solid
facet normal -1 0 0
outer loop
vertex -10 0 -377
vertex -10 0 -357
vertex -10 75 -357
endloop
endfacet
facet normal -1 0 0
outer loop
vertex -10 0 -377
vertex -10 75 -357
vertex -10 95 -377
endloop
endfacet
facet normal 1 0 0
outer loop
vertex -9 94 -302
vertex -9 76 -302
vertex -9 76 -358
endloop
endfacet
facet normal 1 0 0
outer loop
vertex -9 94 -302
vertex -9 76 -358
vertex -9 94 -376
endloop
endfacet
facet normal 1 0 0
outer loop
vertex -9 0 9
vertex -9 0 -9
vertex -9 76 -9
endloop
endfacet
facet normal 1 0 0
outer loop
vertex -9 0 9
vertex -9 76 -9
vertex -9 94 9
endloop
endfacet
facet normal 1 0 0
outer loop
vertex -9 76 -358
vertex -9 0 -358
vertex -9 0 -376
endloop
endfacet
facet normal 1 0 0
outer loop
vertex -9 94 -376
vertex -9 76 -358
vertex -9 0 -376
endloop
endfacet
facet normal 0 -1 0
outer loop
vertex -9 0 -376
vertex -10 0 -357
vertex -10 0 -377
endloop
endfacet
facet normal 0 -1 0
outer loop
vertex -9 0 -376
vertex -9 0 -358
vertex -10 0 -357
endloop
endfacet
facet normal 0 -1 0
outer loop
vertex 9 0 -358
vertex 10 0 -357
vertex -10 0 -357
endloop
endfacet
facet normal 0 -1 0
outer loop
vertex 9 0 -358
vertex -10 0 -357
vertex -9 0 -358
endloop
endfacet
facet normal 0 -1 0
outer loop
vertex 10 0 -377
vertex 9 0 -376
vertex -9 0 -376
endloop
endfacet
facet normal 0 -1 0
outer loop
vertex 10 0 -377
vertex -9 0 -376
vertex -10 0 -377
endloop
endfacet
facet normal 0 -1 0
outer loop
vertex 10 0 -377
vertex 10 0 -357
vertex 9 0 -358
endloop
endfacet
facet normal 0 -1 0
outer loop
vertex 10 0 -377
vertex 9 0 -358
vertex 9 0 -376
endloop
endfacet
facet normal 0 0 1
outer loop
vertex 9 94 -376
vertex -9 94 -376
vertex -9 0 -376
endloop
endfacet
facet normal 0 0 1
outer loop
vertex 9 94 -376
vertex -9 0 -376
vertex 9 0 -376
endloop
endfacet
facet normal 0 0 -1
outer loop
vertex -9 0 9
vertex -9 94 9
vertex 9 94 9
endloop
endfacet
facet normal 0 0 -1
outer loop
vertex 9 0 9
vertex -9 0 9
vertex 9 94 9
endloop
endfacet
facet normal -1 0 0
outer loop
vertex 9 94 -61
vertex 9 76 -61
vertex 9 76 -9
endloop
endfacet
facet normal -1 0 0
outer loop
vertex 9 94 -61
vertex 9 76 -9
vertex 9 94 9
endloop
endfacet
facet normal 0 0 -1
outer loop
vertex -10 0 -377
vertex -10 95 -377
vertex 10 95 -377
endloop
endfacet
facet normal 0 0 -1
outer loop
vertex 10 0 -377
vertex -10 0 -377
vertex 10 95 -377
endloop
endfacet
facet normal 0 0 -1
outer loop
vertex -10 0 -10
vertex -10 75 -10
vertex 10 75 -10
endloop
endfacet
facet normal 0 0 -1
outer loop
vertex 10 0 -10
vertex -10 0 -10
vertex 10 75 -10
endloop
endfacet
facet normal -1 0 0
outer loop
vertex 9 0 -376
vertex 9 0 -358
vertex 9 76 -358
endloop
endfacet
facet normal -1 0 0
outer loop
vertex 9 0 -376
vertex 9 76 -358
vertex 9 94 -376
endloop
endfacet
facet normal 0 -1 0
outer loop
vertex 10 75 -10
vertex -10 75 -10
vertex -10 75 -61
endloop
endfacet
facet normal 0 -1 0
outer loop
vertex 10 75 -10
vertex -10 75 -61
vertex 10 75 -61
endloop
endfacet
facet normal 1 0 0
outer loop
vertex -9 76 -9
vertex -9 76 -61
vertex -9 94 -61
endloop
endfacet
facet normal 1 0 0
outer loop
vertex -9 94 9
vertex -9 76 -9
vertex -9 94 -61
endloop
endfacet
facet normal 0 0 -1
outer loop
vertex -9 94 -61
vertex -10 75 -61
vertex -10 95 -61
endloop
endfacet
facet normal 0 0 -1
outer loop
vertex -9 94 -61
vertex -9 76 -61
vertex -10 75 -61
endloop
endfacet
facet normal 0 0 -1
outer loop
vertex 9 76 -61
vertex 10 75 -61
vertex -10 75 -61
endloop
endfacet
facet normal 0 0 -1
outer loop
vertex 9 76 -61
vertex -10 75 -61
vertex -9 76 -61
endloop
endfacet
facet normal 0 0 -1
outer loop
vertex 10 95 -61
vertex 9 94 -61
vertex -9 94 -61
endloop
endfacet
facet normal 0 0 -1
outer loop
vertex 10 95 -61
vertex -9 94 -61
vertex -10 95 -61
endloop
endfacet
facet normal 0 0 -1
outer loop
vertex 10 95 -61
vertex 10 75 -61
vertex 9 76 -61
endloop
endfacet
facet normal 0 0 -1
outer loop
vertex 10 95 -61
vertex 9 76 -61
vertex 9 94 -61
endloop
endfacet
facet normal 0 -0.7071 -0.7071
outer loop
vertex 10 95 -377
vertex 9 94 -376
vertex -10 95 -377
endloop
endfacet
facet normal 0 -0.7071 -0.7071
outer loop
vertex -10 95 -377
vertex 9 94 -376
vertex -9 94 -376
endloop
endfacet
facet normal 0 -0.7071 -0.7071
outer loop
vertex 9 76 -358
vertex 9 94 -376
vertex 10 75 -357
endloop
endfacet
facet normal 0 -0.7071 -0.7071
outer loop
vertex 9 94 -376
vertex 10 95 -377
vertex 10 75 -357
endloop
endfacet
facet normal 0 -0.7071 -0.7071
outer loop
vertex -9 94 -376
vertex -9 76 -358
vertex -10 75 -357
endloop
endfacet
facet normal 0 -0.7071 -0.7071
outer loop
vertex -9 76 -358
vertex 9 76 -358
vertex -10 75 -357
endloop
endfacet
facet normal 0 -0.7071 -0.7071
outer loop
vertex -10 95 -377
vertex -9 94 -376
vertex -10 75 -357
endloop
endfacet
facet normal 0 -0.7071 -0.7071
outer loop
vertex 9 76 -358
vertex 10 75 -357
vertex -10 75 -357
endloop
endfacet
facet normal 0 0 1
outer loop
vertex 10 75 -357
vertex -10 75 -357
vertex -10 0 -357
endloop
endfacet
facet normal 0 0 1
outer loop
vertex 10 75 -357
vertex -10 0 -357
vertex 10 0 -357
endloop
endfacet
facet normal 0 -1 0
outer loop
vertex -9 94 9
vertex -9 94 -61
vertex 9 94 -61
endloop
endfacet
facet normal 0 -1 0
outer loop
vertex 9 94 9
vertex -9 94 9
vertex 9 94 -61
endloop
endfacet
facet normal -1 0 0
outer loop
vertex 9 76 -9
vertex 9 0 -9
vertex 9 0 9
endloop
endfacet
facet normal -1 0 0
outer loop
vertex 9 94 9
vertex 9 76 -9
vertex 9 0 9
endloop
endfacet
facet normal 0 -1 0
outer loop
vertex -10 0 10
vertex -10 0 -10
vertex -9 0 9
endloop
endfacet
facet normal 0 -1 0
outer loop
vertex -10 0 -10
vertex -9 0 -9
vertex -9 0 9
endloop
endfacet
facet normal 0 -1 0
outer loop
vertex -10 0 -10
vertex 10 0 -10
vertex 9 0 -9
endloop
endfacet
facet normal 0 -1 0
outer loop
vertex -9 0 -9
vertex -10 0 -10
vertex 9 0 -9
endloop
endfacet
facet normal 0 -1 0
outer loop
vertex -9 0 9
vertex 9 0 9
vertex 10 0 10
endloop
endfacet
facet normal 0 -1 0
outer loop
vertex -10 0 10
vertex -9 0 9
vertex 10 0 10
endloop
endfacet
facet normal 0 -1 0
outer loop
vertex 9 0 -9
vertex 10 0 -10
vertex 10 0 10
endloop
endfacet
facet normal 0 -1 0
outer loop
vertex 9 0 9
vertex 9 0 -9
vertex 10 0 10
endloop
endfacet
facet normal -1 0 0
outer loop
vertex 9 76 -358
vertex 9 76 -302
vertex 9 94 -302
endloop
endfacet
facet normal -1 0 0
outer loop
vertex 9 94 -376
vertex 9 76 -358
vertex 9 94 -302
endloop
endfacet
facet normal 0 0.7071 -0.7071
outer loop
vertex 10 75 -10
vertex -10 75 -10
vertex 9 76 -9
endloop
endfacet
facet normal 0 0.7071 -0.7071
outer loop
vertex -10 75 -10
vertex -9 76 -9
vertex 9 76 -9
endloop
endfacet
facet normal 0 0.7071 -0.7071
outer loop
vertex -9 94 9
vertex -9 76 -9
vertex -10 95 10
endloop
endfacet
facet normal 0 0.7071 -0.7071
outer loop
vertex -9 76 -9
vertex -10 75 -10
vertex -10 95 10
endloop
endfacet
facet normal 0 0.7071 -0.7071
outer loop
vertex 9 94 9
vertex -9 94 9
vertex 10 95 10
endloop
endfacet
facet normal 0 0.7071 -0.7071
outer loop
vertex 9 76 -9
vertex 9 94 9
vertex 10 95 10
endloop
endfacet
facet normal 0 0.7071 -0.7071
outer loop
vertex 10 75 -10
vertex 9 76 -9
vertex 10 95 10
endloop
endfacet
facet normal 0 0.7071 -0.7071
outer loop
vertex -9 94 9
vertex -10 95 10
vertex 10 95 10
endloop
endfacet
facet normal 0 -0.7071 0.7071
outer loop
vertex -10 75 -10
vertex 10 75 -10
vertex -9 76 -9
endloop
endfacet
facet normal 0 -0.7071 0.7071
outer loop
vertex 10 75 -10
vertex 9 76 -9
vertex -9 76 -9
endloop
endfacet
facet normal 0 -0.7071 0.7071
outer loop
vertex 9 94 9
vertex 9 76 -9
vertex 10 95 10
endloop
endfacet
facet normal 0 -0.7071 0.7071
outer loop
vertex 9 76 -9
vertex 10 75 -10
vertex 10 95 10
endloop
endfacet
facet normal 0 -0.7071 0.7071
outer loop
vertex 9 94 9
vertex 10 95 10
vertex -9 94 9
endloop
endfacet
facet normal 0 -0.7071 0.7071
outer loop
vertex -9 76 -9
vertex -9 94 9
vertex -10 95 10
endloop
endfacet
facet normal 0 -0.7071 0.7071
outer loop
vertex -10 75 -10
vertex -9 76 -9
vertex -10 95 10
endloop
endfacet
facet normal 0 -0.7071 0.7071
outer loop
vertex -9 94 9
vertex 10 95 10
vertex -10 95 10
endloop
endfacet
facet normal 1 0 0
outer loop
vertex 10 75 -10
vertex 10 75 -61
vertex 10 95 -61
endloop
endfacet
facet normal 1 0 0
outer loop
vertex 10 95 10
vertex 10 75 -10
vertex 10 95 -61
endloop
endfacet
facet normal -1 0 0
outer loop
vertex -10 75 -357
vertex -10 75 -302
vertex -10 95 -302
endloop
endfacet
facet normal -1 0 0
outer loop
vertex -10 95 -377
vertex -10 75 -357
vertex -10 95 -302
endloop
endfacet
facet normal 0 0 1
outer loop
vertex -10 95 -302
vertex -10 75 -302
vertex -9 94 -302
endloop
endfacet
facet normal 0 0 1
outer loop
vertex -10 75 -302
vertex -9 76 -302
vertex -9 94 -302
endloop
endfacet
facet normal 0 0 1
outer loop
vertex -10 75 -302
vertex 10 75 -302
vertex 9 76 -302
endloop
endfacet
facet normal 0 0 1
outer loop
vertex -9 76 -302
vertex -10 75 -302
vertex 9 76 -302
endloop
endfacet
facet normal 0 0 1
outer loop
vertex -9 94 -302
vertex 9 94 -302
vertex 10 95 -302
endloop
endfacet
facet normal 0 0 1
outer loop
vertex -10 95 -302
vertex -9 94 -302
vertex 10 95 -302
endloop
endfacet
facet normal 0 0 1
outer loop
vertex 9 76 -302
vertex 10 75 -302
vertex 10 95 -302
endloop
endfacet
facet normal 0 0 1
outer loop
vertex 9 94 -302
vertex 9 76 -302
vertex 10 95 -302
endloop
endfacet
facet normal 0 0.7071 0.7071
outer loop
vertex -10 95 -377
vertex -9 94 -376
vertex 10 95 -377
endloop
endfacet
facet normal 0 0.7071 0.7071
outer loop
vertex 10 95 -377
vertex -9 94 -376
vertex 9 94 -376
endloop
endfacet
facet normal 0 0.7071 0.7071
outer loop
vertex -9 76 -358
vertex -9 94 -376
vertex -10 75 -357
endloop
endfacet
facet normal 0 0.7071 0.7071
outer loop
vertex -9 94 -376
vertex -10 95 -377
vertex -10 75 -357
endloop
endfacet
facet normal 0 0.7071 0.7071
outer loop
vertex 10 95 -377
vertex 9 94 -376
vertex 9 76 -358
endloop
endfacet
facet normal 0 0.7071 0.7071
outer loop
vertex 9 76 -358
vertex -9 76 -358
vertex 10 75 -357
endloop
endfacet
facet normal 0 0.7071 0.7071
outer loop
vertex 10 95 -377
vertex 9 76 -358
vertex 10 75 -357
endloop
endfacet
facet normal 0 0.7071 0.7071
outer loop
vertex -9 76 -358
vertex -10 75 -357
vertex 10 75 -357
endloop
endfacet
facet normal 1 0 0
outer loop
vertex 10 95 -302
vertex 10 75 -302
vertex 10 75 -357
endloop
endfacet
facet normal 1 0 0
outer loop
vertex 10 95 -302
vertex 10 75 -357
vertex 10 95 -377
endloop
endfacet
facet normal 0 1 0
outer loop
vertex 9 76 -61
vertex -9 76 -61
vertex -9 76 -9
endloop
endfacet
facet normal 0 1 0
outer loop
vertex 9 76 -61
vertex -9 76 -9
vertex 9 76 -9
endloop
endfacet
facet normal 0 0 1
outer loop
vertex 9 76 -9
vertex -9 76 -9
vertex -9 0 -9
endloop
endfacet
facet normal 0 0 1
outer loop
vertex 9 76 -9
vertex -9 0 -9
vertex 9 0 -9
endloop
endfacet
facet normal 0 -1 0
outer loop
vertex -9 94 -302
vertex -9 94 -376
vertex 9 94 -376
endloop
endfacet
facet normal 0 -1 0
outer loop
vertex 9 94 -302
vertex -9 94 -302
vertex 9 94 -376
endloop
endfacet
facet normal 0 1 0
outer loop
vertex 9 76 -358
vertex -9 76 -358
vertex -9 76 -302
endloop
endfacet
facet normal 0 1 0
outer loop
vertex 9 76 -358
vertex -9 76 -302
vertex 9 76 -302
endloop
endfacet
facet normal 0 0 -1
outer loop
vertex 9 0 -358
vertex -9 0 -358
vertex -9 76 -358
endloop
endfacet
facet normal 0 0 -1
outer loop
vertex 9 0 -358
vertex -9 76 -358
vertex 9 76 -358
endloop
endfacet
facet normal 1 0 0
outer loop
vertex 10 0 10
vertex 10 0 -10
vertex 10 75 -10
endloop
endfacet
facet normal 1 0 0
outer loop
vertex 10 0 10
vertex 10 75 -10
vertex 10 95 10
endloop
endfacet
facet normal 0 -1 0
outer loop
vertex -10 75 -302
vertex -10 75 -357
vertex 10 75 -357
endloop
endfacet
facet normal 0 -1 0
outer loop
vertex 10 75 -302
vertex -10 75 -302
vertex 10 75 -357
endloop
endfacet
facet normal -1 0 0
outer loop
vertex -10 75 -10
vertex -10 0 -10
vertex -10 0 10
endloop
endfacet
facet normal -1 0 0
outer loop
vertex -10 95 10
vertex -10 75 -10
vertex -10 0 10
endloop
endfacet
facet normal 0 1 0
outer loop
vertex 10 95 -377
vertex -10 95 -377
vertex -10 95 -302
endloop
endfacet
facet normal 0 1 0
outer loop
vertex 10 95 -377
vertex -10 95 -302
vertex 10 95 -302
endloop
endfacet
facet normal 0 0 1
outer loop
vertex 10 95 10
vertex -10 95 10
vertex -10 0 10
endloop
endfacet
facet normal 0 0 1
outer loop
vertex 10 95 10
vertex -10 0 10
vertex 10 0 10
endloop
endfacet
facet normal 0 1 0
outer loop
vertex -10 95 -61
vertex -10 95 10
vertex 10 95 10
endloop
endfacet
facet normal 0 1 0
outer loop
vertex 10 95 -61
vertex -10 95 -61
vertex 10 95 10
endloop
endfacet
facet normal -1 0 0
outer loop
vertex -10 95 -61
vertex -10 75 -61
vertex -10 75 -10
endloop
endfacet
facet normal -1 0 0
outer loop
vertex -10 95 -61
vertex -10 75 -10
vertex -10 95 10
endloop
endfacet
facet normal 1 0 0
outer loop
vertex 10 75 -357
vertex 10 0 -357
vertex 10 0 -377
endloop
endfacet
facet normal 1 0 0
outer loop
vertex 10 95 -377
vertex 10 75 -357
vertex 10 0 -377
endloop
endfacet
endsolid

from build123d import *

# Parameters (mm, degrees)
SKETCH_11_W                = 20
SKETCH_11_H                = 20
SKETCH_11_W_2              = 18
SKETCH_11_H_2              = 18
F_20X20X1_1_DEPTH          = 100.142135624
SKETCH_11_ON_SEGMENT_2_W   = 20
SKETCH_11_ON_SEGMENT_2_H   = 20
SKETCH_11_ON_SEGMENT_2_W_2 = 18
SKETCH_11_ON_SEGMENT_2_H_2 = 18
F_20X20X1_1_2_DEPTH        = 397.284271247
SKETCH_11_ON_SEGMENT_3_W   = 20
SKETCH_11_ON_SEGMENT_3_H   = 20
SKETCH_11_ON_SEGMENT_3_W_2 = 18
SKETCH_11_ON_SEGMENT_3_H_2 = 18
F_20X20X1_1_3_DEPTH        = 100.142135624
CUT_EXTRUDE_1_REACH        = 391.299
SKETCH_12_R                = 1.5
SKETCH_14_W                = 241
SKETCH_14_H                = 20
CUT_EXTRUDE_3_DEPTH        = 390.299370665


with BuildPart() as part:
    # 草图11 → 铝管 20X20X1(1) (new body)
    with BuildSketch(Plane.ZX):
        Rectangle(SKETCH_11_W, SKETCH_11_H)
        Rectangle(SKETCH_11_W_2, SKETCH_11_H_2, mode=Mode.SUBTRACT)
    extrude(amount=F_20X20X1_1_DEPTH)

    # 铝管 20X20X1(1) mitre 1
    split(bisect_by=Plane(origin=(0, 85, 0), x_dir=(1, 0, 0), z_dir=(0, -0.707106781, 0.707106781)), keep=Keep.TOP)


with BuildPart() as body_2:
    # 草图11 on segment 2 (carried to segment 2) → 20X20X1_1 2 (new body)
    with BuildSketch(Plane(origin=(0, 85, 15.142135624), x_dir=(0, 1, 0), z_dir=(0, 0, -1))):
        Rectangle(SKETCH_11_ON_SEGMENT_2_W, SKETCH_11_ON_SEGMENT_2_H)
        Rectangle(SKETCH_11_ON_SEGMENT_2_W_2, SKETCH_11_ON_SEGMENT_2_H_2, mode=Mode.SUBTRACT)
    extrude(amount=F_20X20X1_1_2_DEPTH)

    # 20X20X1_1 2 mitre 1
    split(bisect_by=Plane(origin=(0, 85, 0), x_dir=(-1, 0, 0), z_dir=(0, 0.707106781, -0.707106781)), keep=Keep.TOP)

    # 20X20X1_1 2 mitre 2
    split(bisect_by=Plane(origin=(0, 85, -367), x_dir=(-1, 0, 0), z_dir=(0, 0.707106781, 0.707106781)), keep=Keep.TOP)

    # 切除-拉伸1: up to this face of the body (flat: up to its plane)
    cut_extrude_1_end = Plane(body_2.part.faces().sort_by_distance((-10, 85.181653043, -183.5))[0])
    # 草图12 → 切除-拉伸1 (cut, up to the picked face)
    with BuildSketch(Plane(origin=(10, 0, 0), x_dir=(0, 0, -1), z_dir=(1, 0, 0)), mode=Mode.PRIVATE) as cut_extrude_1_sk1:
        with Locations((133.5, 81)):
            Circle(SKETCH_12_R)
    cut_extrude_1_tool1 = split(extrude(cut_extrude_1_sk1.sketch, amount=-CUT_EXTRUDE_1_REACH, mode=Mode.PRIVATE), bisect_by=cut_extrude_1_end, keep=Keep.BOTH, mode=Mode.PRIVATE)
    # 草图12 → 切除-拉伸1 (cut, up to the picked face)
    with BuildSketch(Plane(origin=(10, 0, 0), x_dir=(0, 0, -1), z_dir=(1, 0, 0)), mode=Mode.PRIVATE) as cut_extrude_1_sk2:
        with Locations((233.5, 81)):
            Circle(SKETCH_12_R)
    cut_extrude_1_tool2 = split(extrude(cut_extrude_1_sk2.sketch, amount=-CUT_EXTRUDE_1_REACH, mode=Mode.PRIVATE), bisect_by=cut_extrude_1_end, keep=Keep.BOTH, mode=Mode.PRIVATE)
    add(cut_extrude_1_tool1.solids().sort_by(Axis((10, 81, -133.5), (-1, 0, 0)))[0], mode=Mode.SUBTRACT)
    add(cut_extrude_1_tool2.solids().sort_by(Axis((10, 81, -233.5), (-1, 0, 0)))[0], mode=Mode.SUBTRACT)

    # 草图14 → 切除-拉伸3 (cut, through all)
    with BuildSketch(Plane(origin=(10, 0, 0), x_dir=(0, 0, -1), z_dir=(1, 0, 0))):
        with Locations((181.5, 85)):
            Rectangle(SKETCH_14_W, SKETCH_14_H)
    extrude(amount=-CUT_EXTRUDE_3_DEPTH, mode=Mode.SUBTRACT)


with BuildPart() as body_3:
    # 草图11 on segment 3 (carried to segment 3) → 20X20X1_1 3 (new body)
    with BuildSketch(Plane(origin=(0, 100.142135624, -367), x_dir=(0, 0, -1), z_dir=(0, -1, 0))):
        Rectangle(SKETCH_11_ON_SEGMENT_3_W, SKETCH_11_ON_SEGMENT_3_H)
        Rectangle(SKETCH_11_ON_SEGMENT_3_W_2, SKETCH_11_ON_SEGMENT_3_H_2, mode=Mode.SUBTRACT)
    extrude(amount=F_20X20X1_1_3_DEPTH)

    # 20X20X1_1 3 mitre 1
    split(bisect_by=Plane(origin=(0, 85, -367), x_dir=(1, 0, 0), z_dir=(0, -0.707106781, -0.707106781)), keep=Keep.TOP)


with BuildPart() as cut_extrude_3_piece_1:
    # of the separate pieces the step leaves, piece 1, a body of its own (cut_extrude_3_pieces)
    add(body_2.part.solids().sort_by_distance((-10, 75, -302))[0])


with BuildPart() as cut_extrude_3_piece_2:
    # of the separate pieces the step leaves, piece 2, a body of its own (cut_extrude_3_pieces)
    add(body_2.part.solids().sort_by_distance((-10, 75, -10))[0])


solid = Compound([part.part, body_3.part, cut_extrude_3_piece_1.part, cut_extrude_3_piece_2.part])
